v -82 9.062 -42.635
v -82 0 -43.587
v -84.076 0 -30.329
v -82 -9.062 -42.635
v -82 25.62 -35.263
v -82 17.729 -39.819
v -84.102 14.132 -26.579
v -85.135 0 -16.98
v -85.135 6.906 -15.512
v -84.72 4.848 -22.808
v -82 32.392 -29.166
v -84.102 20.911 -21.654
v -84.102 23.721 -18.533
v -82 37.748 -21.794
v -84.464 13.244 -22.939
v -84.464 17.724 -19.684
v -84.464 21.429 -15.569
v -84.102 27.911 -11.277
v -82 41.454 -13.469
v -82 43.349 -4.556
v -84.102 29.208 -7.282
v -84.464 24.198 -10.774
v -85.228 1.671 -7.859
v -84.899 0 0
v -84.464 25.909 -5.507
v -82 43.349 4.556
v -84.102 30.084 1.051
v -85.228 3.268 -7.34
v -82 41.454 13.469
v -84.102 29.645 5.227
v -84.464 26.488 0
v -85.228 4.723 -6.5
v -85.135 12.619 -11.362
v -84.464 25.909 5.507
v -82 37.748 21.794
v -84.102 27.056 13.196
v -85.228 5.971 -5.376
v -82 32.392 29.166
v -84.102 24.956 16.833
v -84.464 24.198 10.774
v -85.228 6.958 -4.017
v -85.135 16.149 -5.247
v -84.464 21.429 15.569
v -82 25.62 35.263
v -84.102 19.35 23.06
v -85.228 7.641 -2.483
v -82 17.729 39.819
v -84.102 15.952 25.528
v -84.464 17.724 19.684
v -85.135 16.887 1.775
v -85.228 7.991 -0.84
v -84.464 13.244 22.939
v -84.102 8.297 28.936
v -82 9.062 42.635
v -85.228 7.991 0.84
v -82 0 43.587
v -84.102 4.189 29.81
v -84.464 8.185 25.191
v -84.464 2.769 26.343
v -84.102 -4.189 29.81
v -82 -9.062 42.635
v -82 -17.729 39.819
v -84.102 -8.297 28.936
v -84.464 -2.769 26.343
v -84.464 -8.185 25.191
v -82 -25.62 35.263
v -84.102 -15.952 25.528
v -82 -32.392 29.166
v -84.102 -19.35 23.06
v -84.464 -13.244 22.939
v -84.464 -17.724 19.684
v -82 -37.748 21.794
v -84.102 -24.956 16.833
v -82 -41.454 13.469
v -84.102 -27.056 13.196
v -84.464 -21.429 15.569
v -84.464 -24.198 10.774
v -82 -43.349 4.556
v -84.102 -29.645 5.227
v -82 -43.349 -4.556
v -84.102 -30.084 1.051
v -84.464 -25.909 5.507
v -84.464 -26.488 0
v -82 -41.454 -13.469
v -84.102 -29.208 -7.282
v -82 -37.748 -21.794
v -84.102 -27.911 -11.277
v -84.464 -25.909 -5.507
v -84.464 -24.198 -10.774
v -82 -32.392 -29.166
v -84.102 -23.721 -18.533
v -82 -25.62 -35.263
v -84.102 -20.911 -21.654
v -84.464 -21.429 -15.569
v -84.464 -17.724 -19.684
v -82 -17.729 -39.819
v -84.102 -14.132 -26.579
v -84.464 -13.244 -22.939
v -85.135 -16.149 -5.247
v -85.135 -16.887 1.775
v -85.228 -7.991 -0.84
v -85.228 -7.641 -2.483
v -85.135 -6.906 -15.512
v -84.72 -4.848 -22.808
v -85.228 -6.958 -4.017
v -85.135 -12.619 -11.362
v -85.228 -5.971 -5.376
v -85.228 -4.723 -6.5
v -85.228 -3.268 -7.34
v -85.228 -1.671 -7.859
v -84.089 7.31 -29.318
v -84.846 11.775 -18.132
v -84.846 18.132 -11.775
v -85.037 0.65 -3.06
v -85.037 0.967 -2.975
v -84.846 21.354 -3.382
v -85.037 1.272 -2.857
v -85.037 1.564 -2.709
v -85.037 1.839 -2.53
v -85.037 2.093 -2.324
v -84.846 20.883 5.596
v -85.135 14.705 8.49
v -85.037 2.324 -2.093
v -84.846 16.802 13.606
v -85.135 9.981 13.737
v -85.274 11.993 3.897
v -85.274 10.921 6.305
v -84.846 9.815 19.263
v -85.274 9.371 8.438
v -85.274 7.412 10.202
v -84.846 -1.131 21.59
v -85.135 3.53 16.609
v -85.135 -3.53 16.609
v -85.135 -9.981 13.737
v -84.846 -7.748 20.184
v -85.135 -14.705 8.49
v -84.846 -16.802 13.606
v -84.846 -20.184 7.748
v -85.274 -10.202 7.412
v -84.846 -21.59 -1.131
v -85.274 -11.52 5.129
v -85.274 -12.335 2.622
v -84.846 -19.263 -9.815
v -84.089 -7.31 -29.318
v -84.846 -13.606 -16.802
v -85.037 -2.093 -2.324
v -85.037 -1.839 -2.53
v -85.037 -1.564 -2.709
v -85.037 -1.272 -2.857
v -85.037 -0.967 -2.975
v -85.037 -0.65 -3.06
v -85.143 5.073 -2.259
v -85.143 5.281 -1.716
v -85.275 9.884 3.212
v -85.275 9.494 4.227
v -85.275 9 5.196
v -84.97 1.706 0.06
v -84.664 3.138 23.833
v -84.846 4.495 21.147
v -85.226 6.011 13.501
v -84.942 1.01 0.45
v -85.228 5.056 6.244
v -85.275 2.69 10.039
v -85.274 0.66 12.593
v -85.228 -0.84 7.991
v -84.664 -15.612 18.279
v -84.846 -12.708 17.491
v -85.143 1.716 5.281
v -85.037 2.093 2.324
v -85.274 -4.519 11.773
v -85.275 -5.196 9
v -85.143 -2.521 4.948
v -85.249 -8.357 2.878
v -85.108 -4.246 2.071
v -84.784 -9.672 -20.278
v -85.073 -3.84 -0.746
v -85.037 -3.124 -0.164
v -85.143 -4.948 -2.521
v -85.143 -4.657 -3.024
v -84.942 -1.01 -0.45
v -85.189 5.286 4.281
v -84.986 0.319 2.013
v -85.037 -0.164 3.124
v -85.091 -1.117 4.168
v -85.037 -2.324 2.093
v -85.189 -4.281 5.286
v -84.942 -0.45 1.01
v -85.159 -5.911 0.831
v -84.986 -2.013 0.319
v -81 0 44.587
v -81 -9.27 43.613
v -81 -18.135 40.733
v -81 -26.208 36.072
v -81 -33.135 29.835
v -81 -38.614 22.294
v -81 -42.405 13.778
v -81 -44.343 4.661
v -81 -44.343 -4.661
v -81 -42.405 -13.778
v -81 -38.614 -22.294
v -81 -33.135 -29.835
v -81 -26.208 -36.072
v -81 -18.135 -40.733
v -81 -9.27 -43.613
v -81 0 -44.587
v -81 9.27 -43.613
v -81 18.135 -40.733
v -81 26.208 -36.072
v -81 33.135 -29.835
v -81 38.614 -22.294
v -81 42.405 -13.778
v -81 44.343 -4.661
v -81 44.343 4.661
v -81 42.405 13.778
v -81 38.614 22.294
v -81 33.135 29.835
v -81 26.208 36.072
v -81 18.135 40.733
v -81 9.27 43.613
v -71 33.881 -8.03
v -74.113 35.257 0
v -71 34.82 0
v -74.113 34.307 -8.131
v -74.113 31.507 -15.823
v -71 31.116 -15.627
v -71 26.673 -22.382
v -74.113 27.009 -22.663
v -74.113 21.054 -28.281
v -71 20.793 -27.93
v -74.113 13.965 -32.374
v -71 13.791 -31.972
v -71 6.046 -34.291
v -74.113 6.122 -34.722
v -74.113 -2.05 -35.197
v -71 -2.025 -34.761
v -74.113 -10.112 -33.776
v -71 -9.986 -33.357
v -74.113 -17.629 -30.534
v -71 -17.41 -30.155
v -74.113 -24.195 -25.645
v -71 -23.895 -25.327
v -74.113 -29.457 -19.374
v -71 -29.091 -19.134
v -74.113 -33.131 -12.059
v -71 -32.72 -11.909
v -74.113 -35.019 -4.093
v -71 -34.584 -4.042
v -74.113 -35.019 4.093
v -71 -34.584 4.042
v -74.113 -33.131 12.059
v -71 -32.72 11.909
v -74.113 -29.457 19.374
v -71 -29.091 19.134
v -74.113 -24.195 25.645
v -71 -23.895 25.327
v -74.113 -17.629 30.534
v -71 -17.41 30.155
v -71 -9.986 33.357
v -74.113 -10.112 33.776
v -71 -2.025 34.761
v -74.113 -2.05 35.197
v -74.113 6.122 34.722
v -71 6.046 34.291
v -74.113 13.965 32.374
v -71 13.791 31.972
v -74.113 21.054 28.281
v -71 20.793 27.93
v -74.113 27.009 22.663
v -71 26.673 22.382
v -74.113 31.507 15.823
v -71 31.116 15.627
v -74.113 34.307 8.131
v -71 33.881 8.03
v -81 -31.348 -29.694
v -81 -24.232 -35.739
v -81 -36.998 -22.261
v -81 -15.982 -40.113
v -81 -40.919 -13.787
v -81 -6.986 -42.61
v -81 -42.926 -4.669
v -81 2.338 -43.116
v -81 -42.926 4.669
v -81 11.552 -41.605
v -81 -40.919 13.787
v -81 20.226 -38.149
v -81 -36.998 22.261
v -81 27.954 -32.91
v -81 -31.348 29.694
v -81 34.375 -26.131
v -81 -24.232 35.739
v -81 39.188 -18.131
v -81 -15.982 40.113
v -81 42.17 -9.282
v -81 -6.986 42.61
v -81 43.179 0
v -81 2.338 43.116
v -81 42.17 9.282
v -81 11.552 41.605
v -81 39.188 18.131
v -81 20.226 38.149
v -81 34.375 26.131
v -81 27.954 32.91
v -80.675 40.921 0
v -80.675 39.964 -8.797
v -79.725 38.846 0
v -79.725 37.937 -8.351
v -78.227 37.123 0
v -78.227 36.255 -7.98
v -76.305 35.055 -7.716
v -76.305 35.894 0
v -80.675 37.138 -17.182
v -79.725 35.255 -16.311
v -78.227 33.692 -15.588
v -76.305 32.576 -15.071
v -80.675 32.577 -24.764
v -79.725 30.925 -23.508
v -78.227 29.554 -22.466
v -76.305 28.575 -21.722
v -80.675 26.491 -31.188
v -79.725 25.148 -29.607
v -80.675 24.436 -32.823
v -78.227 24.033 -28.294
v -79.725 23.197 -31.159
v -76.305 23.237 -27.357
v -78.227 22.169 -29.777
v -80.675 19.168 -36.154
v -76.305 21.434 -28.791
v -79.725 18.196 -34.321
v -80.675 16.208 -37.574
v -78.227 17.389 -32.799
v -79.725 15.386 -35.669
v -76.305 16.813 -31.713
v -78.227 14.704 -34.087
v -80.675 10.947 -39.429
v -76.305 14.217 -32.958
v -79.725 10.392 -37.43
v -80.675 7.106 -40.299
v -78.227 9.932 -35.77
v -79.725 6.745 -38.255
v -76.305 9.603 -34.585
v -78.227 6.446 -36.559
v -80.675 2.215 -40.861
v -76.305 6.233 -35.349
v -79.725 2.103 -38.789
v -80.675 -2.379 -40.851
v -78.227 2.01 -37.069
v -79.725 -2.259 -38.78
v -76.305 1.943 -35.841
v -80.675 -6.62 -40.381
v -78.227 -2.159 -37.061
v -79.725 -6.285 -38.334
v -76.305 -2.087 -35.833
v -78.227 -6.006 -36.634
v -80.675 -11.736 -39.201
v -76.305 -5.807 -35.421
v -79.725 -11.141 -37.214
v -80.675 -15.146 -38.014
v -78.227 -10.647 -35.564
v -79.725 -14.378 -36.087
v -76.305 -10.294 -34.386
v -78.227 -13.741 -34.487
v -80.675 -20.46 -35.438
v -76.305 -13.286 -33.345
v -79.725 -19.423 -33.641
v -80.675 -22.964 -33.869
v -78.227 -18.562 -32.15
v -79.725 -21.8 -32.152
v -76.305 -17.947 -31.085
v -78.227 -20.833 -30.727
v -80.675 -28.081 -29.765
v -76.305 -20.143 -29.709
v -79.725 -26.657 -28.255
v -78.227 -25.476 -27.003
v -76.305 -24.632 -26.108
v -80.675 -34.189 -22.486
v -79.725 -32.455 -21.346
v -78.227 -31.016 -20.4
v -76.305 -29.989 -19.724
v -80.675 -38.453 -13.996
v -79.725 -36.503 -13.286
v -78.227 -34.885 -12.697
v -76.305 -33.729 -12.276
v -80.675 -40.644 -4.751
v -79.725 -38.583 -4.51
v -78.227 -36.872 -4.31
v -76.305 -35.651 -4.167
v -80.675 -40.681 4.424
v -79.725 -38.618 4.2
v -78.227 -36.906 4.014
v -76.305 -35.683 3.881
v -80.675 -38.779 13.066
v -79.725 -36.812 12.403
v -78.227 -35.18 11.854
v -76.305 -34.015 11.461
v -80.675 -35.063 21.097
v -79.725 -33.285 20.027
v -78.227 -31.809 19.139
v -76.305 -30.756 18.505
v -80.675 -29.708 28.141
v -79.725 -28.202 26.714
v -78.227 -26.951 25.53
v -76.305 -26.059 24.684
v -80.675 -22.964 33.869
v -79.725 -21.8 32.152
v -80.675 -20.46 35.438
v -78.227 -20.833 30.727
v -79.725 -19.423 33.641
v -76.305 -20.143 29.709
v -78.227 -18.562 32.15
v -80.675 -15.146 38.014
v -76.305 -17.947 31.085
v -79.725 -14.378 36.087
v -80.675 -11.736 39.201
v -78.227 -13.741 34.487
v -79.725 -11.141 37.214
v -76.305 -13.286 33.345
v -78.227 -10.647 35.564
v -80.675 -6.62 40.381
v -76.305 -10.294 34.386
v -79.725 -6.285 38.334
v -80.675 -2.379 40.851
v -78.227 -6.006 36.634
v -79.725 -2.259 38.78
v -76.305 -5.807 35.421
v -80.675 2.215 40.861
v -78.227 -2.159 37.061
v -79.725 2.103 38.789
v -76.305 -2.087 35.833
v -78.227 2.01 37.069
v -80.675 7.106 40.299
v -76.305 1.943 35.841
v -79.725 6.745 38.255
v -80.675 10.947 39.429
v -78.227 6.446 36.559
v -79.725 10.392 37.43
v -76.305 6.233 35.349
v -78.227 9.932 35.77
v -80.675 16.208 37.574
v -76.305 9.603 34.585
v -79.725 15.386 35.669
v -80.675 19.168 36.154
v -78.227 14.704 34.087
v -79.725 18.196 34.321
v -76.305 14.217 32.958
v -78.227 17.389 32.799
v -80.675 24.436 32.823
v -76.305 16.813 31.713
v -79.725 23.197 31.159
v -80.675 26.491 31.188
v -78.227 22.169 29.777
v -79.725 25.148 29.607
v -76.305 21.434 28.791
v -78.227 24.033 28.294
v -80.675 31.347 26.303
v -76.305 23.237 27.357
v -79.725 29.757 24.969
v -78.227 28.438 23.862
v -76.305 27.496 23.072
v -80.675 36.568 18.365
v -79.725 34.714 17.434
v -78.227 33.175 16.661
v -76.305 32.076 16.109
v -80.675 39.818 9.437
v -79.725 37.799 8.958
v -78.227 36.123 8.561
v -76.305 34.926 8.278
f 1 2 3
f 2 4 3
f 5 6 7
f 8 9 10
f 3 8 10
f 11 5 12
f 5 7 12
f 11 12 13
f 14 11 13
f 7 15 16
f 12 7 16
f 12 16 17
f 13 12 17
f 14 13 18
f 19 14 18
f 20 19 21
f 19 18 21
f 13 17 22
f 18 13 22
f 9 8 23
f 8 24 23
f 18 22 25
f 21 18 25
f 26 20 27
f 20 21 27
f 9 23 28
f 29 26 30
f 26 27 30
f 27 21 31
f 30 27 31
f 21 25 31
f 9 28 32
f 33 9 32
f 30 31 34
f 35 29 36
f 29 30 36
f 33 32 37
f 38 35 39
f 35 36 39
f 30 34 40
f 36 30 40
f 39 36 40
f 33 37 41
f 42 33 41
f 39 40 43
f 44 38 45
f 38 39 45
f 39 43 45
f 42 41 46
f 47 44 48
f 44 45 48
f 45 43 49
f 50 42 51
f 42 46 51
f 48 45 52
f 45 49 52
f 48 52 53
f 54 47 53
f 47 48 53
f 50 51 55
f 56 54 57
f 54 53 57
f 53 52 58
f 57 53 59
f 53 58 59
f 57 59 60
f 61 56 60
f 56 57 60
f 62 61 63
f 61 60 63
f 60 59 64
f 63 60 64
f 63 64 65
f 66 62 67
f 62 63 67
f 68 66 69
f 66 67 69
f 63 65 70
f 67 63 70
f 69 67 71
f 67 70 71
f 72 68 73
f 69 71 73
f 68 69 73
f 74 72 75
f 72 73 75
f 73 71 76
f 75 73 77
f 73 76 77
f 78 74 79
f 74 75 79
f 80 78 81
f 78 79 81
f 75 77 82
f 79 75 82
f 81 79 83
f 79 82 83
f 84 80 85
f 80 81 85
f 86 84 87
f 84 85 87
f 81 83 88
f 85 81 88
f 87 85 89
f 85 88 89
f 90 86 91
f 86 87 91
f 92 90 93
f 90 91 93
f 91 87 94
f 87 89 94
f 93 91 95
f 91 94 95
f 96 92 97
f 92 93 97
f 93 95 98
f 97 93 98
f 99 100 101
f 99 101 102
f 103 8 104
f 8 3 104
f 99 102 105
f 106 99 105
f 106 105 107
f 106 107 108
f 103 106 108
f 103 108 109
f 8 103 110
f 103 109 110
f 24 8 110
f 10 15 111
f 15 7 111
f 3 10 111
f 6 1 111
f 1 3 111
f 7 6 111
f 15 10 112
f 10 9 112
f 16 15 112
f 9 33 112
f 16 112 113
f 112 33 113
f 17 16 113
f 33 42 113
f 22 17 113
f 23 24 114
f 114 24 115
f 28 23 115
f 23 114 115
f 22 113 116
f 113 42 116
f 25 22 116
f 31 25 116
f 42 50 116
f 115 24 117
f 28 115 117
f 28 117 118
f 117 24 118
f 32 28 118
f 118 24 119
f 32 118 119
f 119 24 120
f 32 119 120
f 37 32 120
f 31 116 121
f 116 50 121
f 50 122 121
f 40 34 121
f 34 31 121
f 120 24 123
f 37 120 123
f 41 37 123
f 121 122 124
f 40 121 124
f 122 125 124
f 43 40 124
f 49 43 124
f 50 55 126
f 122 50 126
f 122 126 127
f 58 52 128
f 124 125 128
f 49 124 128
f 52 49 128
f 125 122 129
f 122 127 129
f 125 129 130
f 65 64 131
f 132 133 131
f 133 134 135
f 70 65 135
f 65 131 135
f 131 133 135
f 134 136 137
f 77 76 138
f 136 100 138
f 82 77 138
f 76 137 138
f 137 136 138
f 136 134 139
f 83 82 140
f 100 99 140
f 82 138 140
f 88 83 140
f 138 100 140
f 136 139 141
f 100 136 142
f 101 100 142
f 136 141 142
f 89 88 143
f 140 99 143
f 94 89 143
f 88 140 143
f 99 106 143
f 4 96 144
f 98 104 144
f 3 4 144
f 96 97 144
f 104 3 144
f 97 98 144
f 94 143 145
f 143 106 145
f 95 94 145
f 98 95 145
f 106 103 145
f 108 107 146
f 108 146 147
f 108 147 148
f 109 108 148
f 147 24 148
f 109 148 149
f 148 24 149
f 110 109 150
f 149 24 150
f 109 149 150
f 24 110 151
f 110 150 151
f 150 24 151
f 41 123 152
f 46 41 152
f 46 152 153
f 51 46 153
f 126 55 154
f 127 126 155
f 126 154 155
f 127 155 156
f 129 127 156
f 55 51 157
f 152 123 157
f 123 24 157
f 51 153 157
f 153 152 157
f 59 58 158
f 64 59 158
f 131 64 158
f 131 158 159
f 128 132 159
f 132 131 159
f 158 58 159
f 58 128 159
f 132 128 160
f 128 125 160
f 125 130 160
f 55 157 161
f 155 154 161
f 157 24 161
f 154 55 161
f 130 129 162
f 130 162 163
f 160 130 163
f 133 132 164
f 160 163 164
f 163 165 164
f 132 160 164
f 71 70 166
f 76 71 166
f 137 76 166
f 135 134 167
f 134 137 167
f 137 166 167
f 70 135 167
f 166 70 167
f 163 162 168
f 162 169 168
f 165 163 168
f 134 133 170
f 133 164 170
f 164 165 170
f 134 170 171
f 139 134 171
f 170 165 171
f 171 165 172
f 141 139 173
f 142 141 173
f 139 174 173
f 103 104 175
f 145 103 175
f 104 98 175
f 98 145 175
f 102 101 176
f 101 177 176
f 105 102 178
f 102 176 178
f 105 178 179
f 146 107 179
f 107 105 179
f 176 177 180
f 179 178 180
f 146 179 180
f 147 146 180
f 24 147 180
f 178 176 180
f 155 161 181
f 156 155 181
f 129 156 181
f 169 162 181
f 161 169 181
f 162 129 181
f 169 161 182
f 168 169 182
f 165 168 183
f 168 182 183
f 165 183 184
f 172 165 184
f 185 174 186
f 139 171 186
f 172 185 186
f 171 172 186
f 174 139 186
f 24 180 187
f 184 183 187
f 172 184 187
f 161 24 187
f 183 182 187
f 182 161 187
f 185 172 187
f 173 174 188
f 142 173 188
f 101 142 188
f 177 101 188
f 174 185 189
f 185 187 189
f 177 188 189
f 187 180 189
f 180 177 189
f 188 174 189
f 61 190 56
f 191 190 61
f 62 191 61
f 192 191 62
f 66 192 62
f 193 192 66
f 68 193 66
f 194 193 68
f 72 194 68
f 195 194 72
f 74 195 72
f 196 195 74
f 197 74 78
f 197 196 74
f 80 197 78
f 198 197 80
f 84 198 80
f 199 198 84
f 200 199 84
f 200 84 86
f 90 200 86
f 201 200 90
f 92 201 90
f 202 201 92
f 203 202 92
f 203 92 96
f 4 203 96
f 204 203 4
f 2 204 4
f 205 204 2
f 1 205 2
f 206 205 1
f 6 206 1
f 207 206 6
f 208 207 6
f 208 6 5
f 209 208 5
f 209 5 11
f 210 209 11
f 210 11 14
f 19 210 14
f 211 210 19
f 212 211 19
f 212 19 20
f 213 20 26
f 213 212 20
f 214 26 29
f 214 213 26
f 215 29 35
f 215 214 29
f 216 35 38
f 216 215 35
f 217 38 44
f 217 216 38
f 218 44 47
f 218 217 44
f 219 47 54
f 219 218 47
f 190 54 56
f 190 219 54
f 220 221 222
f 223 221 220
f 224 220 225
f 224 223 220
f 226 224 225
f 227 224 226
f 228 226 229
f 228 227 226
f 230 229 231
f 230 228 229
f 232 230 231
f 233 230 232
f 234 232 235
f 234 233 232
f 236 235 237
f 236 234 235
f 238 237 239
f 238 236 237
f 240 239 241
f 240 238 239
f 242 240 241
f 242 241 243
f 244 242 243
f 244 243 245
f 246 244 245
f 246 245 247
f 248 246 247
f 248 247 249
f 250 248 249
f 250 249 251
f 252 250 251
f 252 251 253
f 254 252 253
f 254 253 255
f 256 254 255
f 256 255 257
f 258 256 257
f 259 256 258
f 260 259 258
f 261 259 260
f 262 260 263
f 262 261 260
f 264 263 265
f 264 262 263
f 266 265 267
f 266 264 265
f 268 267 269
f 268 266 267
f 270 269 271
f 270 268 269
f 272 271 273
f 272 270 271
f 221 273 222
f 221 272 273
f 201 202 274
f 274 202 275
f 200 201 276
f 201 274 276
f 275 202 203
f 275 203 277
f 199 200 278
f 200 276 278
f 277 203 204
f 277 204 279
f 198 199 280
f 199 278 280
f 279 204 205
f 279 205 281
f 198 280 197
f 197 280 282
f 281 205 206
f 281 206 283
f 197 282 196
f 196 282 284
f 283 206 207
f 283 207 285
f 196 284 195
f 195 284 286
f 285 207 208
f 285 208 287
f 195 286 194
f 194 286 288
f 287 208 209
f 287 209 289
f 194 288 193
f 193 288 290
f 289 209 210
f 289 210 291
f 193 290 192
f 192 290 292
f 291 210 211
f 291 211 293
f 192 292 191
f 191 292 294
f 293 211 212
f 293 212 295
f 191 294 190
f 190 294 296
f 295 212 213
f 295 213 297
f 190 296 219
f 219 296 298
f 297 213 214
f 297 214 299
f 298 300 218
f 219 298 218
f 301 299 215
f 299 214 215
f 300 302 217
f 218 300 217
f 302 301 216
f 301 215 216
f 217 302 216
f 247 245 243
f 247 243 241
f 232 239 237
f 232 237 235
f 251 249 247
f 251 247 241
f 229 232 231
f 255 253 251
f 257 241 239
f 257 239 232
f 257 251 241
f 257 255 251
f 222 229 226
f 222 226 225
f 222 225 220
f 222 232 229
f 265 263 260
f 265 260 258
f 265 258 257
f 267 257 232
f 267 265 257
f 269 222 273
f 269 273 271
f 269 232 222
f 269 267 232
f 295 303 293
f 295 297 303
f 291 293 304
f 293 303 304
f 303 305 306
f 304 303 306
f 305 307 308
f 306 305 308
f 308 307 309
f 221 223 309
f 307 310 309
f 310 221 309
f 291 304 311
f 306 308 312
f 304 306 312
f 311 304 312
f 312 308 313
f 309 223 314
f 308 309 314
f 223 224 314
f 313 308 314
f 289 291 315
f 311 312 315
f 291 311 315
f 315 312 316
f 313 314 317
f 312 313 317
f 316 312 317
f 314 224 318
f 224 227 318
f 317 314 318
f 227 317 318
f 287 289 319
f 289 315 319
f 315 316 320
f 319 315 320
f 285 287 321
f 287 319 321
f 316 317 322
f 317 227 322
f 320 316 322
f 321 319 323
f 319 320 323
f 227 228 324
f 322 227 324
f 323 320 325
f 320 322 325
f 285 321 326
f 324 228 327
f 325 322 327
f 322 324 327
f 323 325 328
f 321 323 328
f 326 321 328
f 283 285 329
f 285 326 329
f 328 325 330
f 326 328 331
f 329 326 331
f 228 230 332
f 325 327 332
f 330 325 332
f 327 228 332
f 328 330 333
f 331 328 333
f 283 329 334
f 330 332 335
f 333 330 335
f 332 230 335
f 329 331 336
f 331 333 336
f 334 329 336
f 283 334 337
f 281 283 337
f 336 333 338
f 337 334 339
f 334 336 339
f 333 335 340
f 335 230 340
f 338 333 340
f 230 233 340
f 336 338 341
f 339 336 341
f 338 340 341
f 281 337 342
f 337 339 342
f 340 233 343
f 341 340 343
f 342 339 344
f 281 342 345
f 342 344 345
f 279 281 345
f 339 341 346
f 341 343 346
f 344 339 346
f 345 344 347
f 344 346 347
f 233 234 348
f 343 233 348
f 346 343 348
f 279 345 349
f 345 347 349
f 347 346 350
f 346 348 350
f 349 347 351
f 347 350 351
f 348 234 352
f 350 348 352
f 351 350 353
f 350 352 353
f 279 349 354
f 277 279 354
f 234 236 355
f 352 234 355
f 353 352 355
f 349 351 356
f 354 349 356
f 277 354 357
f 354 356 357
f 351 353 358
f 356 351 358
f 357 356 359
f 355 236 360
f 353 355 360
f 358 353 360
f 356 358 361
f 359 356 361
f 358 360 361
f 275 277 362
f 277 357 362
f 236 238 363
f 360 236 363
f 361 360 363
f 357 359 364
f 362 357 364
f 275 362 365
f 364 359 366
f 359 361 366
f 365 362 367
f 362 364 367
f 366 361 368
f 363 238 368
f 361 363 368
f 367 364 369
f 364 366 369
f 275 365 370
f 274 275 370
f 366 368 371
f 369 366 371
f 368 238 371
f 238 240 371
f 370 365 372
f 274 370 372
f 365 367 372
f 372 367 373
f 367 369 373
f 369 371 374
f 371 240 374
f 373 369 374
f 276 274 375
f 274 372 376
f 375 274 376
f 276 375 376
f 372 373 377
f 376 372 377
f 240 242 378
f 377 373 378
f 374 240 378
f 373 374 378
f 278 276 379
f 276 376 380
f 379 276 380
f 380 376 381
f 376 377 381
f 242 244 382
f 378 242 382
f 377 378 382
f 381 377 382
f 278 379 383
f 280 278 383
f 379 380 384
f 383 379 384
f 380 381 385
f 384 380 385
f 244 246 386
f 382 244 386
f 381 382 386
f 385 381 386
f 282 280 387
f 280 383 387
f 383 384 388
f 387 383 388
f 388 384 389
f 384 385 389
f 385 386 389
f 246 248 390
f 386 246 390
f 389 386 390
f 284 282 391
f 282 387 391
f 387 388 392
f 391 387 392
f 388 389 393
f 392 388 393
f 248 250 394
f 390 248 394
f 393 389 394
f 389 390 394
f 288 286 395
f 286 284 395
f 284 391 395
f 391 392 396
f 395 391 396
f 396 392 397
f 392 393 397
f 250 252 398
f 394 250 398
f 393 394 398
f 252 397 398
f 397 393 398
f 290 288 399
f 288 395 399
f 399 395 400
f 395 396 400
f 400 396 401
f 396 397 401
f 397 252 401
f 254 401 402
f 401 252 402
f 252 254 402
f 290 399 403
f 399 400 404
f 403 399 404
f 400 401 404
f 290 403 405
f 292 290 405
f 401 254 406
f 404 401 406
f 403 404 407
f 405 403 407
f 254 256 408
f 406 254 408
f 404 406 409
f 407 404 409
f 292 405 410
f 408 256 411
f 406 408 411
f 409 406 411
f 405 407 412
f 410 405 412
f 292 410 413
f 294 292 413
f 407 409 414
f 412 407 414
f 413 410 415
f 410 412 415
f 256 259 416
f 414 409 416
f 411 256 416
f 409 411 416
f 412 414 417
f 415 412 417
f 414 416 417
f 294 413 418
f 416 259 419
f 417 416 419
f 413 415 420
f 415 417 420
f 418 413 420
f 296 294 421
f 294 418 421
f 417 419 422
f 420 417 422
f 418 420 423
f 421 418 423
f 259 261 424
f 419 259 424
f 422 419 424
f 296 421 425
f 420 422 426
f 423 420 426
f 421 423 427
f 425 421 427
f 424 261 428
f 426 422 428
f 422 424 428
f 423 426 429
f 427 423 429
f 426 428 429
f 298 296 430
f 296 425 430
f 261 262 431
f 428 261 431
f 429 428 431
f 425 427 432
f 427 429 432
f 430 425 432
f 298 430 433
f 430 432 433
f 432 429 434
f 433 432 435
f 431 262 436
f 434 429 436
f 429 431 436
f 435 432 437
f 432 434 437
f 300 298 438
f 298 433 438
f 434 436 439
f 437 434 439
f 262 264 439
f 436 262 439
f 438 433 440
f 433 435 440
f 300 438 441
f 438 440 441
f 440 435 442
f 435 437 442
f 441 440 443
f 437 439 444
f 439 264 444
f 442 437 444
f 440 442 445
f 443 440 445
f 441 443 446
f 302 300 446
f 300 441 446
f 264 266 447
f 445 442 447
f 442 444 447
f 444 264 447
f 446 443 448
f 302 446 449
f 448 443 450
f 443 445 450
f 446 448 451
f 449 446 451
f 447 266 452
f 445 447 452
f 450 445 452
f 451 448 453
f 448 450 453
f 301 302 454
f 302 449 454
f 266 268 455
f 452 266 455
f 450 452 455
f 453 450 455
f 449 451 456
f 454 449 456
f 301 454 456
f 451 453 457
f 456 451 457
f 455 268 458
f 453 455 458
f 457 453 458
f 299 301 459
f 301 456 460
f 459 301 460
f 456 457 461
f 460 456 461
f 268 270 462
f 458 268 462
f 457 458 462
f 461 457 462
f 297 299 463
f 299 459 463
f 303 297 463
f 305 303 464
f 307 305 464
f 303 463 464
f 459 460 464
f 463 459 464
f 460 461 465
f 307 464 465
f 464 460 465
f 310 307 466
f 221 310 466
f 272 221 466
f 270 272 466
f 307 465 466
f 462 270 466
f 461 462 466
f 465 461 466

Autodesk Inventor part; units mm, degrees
ref_plane "XZ Plane" through (0, 0, 0) normal (0, 1, 0) x (-1, 0, 0)
ref_plane "XY Plane" through (0, 0, 0) normal (0, 0, 1) x (1, 0, 0)
ref_plane "Work Plane5" through (-81, 0, 0) normal (1, 0, 0) x (0, 1, 0)
sketch "Sketch9" plane through (-81, 0, 0) normal (1, 0, 0) x (0, 1, 0)
  circle A0 centre (0, 0) radius 36.225
  dimension "d79" = 72.45
extrude "Extrusion5" add sketch "Sketch9" along normal blind 10 draft -8
sketch "Sketch10" plane through (-81, 0, 0) normal (-1, 0, 0) x (0, 0, 1)
  circle A0 centre (0, 0) radius 43.5874
extrude "Extrusion6" add sketch "Sketch10" along normal blind 1
fillet "Fillet12" radius 8 1 edges at (-81, -36.225, 0)
draft "FaceDraft1" angle 45 pull direction (-1, 0, 0) faces at (-81.6667, -40.4135, -16.3281) fixed edges at (-82, 0, -43.5874)
sketch "Sketch16" plane through (0, 0, 0) normal (0, 1, 0) x (-1, 0, 0)
  line L0 (82, -43.5874) -> (82, 43.5874) projected
  line L1 (82, -43.5874) -> (83.9506, -32.6257) construction
  line L2 (83.9506, -32.6257) -> (84.4455, -26.8642) construction
  line L3 (84.4455, -26.8642) -> (85.3944, -15.8156) construction
  line L4 (85.3944, -15.8156) -> (85.3944, -9.2357) construction
  line L5 (85.3944, -9.2357) -> (84.8986, -0.5811) construction
  line L6 (84.8986, -0.5811) -> (84.8986, 0) construction
  spline S0 degree 4 poles (82, -43.5874) (83.9506, -32.6257) (84.4455, -26.8642) (85.3944, -15.8156) (85.3944, -9.2357) (84.8986, -0.5811) (84.8986, 0) knots 1 1 1 1 1 2 3 4 4 4 4 4
  line L7 (84.8986, 0) -> (82, 0)
  point P0 (0, 0)
revolve "Revolution3" add sketch "Sketch16" angle 360 about axis through (-84.8986, 0, 0) along (1, 0, 0)
ref_plane "Work Plane7" through (-96.5, 0, 0) normal (1, 0, 0) x (0, 0, -1)
sketch "Sketch23" plane through (-96.5, 0, 0) normal (1, 0, 0) x (0, 0, -1)
  line L0 (-47.6775, 46.8192) -> (46.7277, 46.8192) construction
  line L1 (46.7277, 46.8192) -> (46.7277, -47.7154) construction
  line L2 (46.7277, -47.7154) -> (-47.6775, -47.7154) construction
  line L3 (-47.6775, -47.7154) -> (-47.6775, 46.8192) construction
  point P0 (0, 0)
properties part number "BMW Cap dish decal ready to attach" material "Brass, Soft Yellow"
